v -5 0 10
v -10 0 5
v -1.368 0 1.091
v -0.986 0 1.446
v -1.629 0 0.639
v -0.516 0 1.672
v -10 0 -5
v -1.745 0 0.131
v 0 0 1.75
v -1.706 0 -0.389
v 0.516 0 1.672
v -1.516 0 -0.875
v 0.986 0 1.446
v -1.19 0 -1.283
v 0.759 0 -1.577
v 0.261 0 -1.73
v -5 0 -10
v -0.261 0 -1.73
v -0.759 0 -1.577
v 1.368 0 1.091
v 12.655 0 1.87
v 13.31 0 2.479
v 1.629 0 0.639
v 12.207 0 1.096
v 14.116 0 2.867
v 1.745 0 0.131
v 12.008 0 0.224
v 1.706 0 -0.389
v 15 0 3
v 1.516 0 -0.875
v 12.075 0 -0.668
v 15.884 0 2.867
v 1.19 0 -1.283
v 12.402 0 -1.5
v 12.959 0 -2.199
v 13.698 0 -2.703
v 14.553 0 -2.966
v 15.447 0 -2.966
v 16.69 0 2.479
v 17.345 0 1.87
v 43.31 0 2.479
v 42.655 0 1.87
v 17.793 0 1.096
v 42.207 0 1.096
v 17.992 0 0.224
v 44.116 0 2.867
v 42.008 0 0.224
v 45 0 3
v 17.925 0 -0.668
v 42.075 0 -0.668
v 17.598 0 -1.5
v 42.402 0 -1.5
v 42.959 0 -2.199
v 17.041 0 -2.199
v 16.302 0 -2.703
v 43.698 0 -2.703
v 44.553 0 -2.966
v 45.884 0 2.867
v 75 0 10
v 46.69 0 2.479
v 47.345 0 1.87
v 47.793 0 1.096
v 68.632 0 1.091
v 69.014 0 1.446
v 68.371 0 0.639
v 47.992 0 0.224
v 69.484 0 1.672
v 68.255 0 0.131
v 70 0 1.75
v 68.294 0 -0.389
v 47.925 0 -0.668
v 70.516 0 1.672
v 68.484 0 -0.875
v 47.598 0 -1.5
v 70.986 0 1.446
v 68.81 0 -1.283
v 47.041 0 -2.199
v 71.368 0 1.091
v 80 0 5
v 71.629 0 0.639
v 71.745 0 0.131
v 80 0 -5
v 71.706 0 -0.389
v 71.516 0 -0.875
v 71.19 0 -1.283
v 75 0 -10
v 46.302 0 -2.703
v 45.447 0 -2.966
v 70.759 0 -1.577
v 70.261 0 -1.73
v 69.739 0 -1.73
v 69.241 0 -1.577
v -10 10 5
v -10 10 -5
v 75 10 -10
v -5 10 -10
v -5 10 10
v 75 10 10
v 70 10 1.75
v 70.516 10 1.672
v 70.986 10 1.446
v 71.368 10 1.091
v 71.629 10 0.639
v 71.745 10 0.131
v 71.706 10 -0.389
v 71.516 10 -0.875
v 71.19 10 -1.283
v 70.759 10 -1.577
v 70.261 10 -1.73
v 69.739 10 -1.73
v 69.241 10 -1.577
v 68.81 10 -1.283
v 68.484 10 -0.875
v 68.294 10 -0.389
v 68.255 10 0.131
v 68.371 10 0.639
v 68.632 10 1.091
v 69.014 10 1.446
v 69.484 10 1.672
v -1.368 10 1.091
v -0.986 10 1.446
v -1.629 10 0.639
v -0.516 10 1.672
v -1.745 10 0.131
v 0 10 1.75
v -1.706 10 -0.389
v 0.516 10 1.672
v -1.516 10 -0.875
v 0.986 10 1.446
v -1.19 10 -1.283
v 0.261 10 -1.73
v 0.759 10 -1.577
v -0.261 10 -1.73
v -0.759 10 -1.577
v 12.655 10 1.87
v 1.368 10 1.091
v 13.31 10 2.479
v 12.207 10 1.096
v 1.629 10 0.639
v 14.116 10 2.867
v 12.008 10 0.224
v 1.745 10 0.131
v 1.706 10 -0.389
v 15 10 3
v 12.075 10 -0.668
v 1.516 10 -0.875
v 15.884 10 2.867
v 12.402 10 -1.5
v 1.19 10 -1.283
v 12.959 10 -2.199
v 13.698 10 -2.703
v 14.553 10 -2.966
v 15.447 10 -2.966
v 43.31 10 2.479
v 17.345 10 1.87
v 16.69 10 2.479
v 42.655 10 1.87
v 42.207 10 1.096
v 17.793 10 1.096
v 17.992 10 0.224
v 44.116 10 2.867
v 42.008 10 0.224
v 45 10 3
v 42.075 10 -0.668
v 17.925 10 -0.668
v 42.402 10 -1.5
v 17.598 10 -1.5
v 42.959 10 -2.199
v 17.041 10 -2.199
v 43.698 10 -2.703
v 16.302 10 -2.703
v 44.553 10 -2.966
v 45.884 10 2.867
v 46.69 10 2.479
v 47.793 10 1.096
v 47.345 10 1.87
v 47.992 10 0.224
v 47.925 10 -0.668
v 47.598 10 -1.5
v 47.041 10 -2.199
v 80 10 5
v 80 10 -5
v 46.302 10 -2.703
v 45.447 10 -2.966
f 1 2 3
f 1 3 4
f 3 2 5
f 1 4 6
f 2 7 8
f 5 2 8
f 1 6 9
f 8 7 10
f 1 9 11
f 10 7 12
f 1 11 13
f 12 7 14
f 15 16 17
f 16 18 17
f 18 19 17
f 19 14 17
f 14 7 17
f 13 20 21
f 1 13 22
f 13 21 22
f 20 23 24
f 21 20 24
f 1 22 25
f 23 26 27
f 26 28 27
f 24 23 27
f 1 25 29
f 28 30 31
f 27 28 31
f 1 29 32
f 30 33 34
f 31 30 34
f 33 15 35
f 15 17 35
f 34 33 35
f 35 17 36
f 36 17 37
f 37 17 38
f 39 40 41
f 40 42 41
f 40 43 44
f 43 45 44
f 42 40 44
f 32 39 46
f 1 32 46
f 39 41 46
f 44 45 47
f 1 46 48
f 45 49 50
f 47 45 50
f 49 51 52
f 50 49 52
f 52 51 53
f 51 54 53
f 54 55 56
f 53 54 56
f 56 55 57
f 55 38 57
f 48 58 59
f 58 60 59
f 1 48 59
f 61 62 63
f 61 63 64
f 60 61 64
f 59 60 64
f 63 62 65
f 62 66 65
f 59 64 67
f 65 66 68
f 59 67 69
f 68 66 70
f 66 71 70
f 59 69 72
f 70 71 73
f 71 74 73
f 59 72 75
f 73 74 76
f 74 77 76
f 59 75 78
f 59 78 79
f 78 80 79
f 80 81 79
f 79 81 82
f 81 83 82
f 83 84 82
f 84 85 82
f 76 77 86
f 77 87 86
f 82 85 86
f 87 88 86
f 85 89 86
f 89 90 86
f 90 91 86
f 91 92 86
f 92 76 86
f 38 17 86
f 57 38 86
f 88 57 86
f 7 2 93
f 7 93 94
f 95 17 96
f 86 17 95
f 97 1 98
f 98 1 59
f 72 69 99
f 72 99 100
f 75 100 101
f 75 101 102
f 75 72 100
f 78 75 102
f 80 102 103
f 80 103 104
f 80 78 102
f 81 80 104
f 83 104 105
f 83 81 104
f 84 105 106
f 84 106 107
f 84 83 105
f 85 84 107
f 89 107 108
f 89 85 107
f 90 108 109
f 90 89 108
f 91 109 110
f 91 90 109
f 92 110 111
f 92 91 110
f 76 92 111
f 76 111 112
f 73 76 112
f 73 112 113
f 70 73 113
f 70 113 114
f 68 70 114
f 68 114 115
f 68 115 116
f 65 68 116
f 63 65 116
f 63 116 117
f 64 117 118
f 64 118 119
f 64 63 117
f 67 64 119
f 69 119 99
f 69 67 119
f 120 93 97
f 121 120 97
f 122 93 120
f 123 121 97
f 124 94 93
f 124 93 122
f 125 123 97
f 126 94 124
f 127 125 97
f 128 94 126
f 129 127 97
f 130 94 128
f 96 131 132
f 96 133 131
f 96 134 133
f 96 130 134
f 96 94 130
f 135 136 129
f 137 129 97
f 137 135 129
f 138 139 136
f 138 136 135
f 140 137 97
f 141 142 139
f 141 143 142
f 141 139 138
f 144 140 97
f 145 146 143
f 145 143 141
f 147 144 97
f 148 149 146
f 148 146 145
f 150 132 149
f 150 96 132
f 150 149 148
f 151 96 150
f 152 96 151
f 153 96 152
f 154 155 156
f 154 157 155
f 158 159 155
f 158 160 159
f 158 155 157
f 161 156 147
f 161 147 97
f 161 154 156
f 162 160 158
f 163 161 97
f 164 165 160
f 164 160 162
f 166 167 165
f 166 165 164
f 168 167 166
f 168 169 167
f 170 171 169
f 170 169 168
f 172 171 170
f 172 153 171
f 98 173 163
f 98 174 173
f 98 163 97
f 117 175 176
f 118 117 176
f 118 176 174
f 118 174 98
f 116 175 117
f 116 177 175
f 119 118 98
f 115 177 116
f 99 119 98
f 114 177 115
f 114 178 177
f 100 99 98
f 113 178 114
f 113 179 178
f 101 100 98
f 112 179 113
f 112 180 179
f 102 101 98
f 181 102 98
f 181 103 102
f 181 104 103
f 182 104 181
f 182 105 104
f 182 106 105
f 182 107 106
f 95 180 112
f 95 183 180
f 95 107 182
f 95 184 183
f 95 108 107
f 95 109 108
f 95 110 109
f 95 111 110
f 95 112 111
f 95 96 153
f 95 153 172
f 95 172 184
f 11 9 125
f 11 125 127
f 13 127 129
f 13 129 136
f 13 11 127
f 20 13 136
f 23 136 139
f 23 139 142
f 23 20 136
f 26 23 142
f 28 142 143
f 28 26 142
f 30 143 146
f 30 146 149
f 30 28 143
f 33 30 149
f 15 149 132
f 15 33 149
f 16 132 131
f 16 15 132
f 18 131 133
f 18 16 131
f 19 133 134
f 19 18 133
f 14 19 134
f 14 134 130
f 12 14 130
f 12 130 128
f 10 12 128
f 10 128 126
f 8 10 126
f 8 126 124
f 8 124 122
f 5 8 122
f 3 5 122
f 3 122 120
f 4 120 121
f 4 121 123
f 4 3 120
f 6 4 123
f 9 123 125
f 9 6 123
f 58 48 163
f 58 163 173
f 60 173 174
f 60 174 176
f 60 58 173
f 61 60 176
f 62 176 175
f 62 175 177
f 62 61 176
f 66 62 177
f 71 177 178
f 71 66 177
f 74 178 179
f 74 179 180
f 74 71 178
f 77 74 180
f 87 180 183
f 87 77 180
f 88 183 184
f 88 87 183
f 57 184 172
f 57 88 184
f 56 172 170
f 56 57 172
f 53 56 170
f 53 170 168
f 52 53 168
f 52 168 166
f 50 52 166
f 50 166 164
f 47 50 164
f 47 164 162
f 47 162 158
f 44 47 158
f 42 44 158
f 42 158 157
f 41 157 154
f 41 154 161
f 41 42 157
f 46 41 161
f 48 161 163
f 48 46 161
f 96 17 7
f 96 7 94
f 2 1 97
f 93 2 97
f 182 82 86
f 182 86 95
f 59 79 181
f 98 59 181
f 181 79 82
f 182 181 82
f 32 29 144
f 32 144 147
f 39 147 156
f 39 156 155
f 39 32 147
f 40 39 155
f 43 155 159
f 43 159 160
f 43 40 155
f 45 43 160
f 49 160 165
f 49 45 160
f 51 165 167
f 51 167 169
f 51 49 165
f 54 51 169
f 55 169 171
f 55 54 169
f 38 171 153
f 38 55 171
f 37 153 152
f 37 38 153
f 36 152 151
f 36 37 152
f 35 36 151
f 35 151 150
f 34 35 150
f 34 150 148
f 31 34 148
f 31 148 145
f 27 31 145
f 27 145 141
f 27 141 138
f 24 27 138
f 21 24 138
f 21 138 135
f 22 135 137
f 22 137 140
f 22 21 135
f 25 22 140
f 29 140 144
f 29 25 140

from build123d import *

# Parameters (mm, degrees)
SKETCH1_W           = 90
SKETCH1_H           = 20
SKETCH1_R           = 1.75
SKETCH1_R_2         = 3
BOSS_EXTRUDE1_DEPTH = 10
CHAMFER1_SIZE       = 5


with BuildPart() as part:
    # Sketch1 → Boss-Extrude1 (new body)
    with BuildSketch(Plane(origin=(0, 0, 0), x_dir=(1, 0, 0), z_dir=(0, 1, 0))):
        with Locations((35, 0)):
            Rectangle(SKETCH1_W, SKETCH1_H)
        with Locations(Location((0, 0, 0), (0, 0, 270))):
            Circle(SKETCH1_R, mode=Mode.SUBTRACT)
        with Locations(Location((70, 0, 0), (0, 0, 270))):
            Circle(SKETCH1_R, mode=Mode.SUBTRACT)
        with Locations(Location((15, 0, 0), (0, 0, 270))):
            Circle(SKETCH1_R_2, mode=Mode.SUBTRACT)
        with Locations(Location((45, 0, 0), (0, 0, 270))):
            Circle(SKETCH1_R_2, mode=Mode.SUBTRACT)
    extrude(amount=BOSS_EXTRUDE1_DEPTH)

    # Chamfer1
    chamfer1_edges = [part.edges().sort_by_distance(p)[0] for p in [
        (-10, 5, -10),
        (80, 5, -10),
        (80, 5, 10),
        (-10, 5, 10),
    ]]
    chamfer(chamfer1_edges, length=CHAMFER1_SIZE)


solid = part.part
